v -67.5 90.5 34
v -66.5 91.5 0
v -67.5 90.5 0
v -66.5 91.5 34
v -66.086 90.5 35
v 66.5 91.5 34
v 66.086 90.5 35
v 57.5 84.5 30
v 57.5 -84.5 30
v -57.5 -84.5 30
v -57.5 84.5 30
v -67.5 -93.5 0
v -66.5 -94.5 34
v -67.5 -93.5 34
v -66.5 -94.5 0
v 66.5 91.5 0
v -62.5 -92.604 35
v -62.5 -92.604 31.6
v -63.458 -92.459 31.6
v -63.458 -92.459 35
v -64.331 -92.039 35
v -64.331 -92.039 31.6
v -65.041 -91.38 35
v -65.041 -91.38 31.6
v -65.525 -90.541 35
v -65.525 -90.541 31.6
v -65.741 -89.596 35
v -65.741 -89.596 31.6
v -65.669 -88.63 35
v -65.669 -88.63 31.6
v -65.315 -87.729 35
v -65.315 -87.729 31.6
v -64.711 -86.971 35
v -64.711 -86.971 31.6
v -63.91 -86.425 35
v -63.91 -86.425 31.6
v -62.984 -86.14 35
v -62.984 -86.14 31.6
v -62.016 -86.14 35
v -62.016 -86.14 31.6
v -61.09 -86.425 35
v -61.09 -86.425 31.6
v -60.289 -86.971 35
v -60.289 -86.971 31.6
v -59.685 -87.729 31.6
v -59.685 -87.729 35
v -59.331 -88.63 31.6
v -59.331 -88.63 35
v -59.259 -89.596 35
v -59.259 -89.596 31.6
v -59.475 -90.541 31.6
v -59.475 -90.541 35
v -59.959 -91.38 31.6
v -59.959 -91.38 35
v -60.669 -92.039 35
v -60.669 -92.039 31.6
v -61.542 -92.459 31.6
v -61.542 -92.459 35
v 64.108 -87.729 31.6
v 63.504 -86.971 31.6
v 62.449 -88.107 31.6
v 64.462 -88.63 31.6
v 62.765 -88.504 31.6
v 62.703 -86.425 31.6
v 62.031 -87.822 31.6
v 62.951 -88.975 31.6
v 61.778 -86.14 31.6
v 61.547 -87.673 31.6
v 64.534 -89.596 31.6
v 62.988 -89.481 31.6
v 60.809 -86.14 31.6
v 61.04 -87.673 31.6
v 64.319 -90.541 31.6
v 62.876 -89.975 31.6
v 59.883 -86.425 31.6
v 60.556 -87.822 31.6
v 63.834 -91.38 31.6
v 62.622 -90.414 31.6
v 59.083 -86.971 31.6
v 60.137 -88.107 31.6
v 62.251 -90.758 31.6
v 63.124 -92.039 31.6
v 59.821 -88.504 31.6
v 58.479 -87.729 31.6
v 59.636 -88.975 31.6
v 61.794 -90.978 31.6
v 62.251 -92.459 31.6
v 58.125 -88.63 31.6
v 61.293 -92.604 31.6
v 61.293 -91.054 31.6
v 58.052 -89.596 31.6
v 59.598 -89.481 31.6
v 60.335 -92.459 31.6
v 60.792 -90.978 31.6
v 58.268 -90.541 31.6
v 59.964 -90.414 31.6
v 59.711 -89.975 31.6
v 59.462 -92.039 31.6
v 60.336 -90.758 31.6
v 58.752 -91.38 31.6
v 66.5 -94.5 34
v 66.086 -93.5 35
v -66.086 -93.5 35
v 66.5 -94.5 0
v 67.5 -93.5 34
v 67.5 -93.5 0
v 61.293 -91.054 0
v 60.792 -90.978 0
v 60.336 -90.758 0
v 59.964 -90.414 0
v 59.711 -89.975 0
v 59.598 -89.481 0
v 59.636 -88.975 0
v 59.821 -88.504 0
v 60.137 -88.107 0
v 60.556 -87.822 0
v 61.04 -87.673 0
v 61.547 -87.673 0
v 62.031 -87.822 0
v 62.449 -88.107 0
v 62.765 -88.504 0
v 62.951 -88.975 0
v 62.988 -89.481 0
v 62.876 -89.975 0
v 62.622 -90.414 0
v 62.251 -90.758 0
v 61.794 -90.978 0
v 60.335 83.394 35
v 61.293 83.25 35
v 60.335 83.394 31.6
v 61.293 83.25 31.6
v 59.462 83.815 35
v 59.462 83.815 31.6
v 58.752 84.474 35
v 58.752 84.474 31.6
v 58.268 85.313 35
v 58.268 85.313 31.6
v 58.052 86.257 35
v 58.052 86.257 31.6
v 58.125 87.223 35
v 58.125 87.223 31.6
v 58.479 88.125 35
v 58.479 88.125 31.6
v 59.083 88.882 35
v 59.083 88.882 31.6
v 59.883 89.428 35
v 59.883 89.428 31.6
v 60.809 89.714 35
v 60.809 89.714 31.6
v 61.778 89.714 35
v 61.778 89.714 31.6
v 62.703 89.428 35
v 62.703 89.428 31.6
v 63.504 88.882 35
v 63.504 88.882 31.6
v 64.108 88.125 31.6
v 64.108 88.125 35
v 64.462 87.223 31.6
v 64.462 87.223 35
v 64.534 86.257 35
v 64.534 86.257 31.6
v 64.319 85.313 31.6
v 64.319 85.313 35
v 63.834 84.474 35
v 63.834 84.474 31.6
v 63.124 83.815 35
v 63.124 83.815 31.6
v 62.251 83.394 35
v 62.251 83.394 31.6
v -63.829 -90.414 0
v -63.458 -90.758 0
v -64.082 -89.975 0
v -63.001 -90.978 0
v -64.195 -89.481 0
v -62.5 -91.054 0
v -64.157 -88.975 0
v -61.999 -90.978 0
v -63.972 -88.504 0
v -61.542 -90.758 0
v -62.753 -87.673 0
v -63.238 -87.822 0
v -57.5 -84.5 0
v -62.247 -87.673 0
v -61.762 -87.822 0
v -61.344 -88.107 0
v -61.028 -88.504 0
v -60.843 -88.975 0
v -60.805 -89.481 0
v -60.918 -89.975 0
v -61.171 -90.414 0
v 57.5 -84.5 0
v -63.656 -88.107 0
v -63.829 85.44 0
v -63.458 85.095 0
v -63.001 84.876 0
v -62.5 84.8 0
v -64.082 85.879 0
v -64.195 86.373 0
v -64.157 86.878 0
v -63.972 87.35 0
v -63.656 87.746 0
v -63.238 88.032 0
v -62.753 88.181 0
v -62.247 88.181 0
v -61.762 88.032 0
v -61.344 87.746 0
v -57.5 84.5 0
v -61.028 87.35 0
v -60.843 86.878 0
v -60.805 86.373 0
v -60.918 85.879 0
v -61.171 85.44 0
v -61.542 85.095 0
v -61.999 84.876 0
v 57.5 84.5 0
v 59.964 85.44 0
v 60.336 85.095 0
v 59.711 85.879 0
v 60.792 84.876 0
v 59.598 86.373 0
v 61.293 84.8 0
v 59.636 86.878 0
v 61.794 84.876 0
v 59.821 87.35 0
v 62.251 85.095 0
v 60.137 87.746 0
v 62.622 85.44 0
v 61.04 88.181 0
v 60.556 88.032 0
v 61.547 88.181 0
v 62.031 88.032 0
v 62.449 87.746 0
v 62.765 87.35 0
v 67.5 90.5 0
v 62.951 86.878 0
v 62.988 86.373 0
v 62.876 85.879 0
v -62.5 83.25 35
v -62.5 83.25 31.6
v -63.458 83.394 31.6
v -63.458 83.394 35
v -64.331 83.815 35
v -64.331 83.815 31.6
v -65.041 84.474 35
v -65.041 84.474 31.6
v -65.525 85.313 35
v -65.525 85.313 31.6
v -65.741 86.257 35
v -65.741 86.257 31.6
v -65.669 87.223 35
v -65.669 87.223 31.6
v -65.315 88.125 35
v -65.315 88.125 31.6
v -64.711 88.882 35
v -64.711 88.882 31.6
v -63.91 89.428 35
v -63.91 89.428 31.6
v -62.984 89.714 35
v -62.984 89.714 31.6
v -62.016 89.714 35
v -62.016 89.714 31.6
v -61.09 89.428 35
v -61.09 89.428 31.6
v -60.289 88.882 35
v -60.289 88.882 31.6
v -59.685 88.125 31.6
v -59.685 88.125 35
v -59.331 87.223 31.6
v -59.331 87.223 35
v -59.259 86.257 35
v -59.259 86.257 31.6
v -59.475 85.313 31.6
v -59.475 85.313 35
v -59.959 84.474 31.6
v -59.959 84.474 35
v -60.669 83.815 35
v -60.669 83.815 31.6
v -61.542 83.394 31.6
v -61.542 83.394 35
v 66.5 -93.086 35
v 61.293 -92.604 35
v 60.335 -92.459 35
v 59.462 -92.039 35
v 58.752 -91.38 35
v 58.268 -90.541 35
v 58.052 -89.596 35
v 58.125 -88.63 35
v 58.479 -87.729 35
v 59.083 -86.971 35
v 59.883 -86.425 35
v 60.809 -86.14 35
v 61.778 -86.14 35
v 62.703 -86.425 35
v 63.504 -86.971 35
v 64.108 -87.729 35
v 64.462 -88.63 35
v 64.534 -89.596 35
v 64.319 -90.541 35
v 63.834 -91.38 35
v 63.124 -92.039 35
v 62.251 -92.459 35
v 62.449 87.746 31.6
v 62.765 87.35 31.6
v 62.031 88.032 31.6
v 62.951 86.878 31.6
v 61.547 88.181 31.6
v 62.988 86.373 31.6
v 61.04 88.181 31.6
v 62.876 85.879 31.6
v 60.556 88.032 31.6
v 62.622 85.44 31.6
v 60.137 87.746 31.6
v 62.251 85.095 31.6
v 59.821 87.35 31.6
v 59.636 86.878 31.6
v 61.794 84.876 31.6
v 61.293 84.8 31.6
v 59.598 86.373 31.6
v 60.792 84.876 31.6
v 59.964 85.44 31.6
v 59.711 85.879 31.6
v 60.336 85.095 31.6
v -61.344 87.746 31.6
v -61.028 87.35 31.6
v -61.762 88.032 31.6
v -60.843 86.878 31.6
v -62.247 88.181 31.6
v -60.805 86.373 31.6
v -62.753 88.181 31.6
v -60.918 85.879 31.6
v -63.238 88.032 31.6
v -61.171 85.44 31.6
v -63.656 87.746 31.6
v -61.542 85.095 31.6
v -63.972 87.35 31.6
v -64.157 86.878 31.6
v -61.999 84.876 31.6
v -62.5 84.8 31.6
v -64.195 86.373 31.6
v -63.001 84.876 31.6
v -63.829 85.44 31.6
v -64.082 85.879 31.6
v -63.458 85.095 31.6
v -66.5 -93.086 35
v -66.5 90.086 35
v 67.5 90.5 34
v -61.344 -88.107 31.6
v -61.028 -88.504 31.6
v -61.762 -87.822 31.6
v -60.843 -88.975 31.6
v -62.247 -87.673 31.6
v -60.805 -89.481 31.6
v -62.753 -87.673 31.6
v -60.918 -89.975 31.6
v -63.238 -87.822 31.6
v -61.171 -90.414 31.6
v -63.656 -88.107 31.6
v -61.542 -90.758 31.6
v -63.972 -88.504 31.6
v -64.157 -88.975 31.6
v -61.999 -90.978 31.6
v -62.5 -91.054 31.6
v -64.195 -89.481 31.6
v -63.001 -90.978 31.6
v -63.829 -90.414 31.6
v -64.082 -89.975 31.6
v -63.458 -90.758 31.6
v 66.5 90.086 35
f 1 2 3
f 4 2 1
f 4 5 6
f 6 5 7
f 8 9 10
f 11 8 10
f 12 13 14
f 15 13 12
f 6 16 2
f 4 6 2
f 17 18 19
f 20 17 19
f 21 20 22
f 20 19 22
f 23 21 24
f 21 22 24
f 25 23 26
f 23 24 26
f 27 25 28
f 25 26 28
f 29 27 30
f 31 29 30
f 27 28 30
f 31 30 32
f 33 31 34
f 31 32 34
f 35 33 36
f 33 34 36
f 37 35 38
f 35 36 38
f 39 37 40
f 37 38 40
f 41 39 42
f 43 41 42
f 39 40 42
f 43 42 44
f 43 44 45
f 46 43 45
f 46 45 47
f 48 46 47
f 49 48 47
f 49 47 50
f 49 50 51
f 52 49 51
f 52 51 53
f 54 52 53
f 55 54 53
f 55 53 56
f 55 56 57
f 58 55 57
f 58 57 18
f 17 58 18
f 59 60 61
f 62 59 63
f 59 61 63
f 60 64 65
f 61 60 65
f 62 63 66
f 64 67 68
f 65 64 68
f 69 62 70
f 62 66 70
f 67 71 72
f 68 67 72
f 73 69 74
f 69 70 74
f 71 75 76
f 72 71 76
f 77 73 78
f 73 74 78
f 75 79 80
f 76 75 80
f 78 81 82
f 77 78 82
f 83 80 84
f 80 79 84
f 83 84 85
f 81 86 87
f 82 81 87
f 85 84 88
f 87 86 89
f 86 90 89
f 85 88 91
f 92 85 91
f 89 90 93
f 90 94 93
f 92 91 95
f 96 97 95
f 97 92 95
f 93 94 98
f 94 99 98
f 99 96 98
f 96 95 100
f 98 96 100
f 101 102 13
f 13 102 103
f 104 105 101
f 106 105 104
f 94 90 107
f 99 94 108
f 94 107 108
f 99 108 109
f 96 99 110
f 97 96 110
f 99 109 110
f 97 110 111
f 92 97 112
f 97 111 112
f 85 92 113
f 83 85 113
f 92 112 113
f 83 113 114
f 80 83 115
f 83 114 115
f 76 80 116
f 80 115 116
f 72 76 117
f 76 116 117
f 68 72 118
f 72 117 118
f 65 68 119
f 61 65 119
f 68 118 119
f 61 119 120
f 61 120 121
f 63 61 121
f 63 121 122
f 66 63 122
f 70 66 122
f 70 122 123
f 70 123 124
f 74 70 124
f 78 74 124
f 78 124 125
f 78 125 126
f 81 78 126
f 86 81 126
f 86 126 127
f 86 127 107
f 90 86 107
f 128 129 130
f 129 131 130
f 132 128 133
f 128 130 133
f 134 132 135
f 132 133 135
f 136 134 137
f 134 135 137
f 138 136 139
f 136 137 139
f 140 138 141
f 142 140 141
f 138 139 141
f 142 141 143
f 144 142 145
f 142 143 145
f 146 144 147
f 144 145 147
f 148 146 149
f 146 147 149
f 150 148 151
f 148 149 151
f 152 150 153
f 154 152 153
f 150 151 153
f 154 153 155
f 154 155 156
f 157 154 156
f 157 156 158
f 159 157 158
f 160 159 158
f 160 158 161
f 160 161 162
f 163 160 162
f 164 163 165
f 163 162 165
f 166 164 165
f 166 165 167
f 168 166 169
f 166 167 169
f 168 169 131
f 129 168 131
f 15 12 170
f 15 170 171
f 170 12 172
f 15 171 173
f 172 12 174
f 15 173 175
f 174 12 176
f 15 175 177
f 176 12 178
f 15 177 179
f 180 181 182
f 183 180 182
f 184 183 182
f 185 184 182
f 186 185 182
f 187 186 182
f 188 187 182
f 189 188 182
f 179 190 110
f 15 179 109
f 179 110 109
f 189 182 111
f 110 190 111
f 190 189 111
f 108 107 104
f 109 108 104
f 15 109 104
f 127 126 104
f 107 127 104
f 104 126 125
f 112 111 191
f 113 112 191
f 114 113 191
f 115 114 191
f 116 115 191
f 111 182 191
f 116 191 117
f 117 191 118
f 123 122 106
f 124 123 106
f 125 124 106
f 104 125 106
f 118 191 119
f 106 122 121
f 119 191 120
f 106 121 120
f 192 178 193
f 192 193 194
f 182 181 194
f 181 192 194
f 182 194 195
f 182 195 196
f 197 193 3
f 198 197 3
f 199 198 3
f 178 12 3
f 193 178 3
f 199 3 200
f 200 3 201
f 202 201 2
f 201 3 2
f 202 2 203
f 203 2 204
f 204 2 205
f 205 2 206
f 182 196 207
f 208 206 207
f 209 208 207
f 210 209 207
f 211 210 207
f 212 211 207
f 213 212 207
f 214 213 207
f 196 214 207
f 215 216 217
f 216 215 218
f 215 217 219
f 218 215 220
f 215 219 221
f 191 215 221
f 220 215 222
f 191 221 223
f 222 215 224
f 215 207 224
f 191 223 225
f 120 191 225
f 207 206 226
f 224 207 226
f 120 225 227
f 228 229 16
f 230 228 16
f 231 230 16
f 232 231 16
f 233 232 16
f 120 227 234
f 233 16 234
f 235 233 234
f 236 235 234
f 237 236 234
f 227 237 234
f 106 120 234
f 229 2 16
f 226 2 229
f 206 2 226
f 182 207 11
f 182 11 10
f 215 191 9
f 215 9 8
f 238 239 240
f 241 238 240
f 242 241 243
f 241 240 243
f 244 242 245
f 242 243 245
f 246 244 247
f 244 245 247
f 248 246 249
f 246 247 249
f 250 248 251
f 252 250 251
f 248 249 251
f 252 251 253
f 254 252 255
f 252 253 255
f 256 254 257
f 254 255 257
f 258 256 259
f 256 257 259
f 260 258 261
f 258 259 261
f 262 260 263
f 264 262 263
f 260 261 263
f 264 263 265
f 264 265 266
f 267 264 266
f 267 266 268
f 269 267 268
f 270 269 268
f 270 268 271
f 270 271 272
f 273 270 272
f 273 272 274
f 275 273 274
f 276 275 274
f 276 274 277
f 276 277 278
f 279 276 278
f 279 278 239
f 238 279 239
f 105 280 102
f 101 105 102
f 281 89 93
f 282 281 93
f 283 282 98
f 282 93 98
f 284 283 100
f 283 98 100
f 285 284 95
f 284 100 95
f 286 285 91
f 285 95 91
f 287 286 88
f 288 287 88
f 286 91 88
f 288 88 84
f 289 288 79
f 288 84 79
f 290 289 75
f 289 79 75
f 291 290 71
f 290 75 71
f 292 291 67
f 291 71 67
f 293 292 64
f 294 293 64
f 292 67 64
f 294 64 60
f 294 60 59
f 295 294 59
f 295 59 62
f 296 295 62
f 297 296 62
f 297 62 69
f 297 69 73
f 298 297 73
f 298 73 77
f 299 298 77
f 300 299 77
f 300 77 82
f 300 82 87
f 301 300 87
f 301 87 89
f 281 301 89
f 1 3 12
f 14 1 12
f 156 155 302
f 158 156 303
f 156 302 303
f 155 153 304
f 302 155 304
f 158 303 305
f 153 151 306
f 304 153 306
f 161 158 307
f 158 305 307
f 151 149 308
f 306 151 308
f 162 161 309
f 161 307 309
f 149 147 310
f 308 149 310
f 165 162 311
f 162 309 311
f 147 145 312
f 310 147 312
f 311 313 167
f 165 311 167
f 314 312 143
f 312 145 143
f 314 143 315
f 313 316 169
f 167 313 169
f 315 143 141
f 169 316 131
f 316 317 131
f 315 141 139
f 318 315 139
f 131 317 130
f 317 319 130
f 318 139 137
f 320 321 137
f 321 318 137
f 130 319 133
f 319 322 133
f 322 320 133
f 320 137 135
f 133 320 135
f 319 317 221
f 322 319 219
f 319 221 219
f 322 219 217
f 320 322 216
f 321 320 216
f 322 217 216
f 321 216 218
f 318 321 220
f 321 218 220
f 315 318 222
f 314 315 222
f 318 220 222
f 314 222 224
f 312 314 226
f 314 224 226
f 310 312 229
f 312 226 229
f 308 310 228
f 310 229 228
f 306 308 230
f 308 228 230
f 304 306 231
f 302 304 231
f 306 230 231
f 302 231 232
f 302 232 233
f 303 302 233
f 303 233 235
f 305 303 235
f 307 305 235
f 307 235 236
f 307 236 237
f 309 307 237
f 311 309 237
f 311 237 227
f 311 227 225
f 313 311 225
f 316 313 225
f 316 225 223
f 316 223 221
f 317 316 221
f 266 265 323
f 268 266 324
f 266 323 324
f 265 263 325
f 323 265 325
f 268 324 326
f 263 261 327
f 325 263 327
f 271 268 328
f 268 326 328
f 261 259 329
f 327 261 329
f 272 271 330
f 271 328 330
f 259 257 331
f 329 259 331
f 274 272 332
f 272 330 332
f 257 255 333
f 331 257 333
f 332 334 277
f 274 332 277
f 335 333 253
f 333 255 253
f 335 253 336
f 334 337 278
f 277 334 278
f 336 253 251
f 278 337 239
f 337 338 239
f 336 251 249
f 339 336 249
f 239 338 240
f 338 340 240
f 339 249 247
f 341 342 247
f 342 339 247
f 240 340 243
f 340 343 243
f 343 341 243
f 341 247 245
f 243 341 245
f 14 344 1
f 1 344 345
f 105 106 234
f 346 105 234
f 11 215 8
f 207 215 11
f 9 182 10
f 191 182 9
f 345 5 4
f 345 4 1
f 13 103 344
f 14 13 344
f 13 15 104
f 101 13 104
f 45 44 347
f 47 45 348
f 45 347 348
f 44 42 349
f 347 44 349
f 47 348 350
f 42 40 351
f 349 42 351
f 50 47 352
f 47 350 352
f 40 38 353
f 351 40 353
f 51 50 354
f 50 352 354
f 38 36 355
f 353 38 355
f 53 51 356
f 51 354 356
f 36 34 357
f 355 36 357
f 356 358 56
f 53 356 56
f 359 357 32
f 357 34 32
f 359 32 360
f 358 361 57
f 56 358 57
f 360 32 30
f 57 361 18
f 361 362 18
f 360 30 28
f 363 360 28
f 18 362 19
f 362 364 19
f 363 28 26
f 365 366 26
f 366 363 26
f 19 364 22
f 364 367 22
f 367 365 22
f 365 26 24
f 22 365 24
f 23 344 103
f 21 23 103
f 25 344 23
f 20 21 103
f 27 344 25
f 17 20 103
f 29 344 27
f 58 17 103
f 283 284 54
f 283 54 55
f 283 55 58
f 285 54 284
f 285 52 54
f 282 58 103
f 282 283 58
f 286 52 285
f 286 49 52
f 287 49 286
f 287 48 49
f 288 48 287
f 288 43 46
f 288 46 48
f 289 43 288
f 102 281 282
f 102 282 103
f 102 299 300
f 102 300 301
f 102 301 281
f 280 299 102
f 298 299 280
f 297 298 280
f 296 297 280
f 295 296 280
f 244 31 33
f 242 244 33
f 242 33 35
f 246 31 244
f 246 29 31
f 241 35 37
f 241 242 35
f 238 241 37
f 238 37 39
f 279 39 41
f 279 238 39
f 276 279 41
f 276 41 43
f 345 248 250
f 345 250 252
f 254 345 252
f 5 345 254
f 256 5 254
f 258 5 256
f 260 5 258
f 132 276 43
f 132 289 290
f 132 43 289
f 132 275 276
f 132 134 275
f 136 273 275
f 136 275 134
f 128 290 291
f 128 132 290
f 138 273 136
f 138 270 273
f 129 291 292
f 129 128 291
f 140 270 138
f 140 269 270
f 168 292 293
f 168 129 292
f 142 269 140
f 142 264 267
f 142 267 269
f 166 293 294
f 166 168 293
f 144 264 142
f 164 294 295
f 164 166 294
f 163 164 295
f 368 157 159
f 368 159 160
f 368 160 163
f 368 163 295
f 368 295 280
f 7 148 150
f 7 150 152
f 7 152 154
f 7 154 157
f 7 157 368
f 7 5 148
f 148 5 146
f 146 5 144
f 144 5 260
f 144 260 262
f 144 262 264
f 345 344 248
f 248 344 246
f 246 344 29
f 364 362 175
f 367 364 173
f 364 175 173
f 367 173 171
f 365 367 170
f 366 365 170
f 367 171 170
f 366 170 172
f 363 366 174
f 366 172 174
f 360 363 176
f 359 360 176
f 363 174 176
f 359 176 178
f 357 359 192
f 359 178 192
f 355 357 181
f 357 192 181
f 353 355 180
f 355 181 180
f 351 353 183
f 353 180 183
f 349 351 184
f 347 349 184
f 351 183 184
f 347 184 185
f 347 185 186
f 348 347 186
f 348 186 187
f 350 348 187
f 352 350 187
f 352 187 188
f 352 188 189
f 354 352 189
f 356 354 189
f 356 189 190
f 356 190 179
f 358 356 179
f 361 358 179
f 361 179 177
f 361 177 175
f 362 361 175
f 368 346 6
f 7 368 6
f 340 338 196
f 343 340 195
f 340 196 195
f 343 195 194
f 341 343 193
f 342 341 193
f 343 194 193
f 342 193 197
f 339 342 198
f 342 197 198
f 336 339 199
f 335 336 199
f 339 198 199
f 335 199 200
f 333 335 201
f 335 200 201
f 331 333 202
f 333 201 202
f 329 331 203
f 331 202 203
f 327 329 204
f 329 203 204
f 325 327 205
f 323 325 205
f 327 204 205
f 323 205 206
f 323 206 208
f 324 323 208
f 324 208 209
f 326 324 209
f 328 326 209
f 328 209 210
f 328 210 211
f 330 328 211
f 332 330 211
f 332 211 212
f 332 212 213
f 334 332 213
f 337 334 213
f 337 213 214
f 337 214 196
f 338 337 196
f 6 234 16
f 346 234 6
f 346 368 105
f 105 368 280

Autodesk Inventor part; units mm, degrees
ref_plane "YZ Plane" through (0, 0, 0) normal (1, 0, 0) x (0, 1, 0)
ref_plane "XZ Plane" through (0, 0, 0) normal (0, 1, 0) x (-1, 0, 0)
ref_plane "XY Plane" through (0, 0, 0) normal (0, 0, 1) x (1, 0, 0)
sketch "Sketch1" plane through (0, 0, 0) normal (0, 0, 1) x (1, 0, 0)
  line L0 (-61.5, -83.5) -> (62.5, -83.5)
  line L1 (62.5, -83.5) -> (62.5, 73.5)
  line L2 (62.5, 73.5) -> (-61.5, 73.5)
  line L3 (-61.5, 73.5) -> (-61.5, -83.5)
  line L4 (-67.5, -94.5) -> (67.5, -94.5) projected
  line L5 (67.5, -94.5) -> (67.5, 91.5) projected
  line L6 (62.5, -70.5) -> (-20.5, -70.5) projected
  line L7 (-20.5, 73.5) -> (62.5, 73.5) projected
  line L8 (62.5, 73.5) -> (62.5, -70.5) projected
  line L9 (67.5, 91.5) -> (-67.5, 91.5) projected
  line L10 (-67.5, 91.5) -> (-67.5, -94.5) projected
  circle A0 centre (61.2932, 86.5) radius 2 projected
  circle A1 centre (61.2932, -89.3536) radius 2 projected
  circle A2 centre (-62.5, -89.3536) radius 2 projected
  circle A3 centre (-62.5, 86.5) radius 2 projected
  line L11 (-64.5, -83.5) -> (-64.5, 80.5) projected
  line L12 (-58.5, 86.5) -> (-64.5, 80.5) projected
  line L13 (-58.5, 86.5) -> (-30.5, 86.5) projected
  line L14 (-30.5, 86.5) -> (-30.5, 24) projected
  line L15 (-30.5, 24) -> (-20.5, 24) projected
  line L16 (-20.5, 24) -> (-20.5, 73.5) projected
  line L17 (-20.5, -70.5) -> (-20.5, -21) projected
  line L18 (-20.5, -21) -> (-30.5, -21) projected
  line L19 (-30.5, -21) -> (-30.5, -89.5) projected
  line L20 (-30.5, -89.5) -> (-58.5, -89.5) projected
  line L21 (-64.5, -83.5) -> (-58.5, -89.5) projected
  point P0 (0, 0)
  point P1 (67.5, -91)
  point P2 (67, 91.5)
  point P3 (-67, 91.5)
  point P4 (-67.5, 91)
extrude "Extrusion1" add sketch "Sketch1" along normal blind 35 contours L3 L2 L14 L15 L16 L1 L6 L17 L18 L19 L0 | L0 L19 L20 L21 L11 L12 L13 L14 L2 L3 | L19 L18 L17 L6 L1 L0 | L2 L16 L15 L14 | L10 L9 L5 L4 | A0 | A1 | A2 | A3
sketch "Skizze3" plane through (0, 0, 35) normal (0, 0, 1) x (1, 0, 0)
  circle A0 centre (61.2932, 86.5) radius 2 projected
  circle A1 centre (-62.5, 86.5) radius 2 projected
  circle A2 centre (61.2932, -89.3536) radius 2 projected
  circle A3 centre (-62.5, -89.3536) radius 2 projected
  point P0 (0, 0)
hole "Bohrung1" at (-62.5, 86.5, 35) at (61.2932, 86.5, 35) at (61.2932, -89.3536, 35) at (-62.5, -89.3536, 35) direction (0, 0, -1) diameter 3.4 end through all counterbore diameter 6.5 counterbore depth 3.4 clearance for "Inbusschraube DIN EN ISO 4762" size "M3" standard "DIN"
sketch "Skizze4" plane through (0, 0, 0) normal (0, 0, -1) x (-1, 0, 0)
  line L0 (-57.5, 84.5) -> (57.5, 84.5)
  line L1 (57.5, 84.5) -> (57.5, -84.5)
  line L2 (57.5, -84.5) -> (-57.5, -84.5)
  line L3 (-57.5, -84.5) -> (-57.5, 84.5)
  line L4 (-57.5, 84.5) -> (57.5, -84.5) construction
  line L5 (57.5, 84.5) -> (-57.5, -84.5) construction
  line L6 (67.5, 91.5) -> (67.5, -94.5) projected
  line L7 (67.5, -94.5) -> (-67.5, -94.5) projected
  point P0 (0, 0)
  dimension "d14" = 10
  dimension "d15" = 10
extrude "Extrusion3" cut sketch "Skizze4" against normal blind 30
chamfer "Fasen2" distance 1 angle 45 4 edges at (-67.5, -94.5, 17.5) (-67.5, 91.5, 17.5) (67.5, 91.5, 17.5) (67.5, -94.5, 17.5)
chamfer "Fasen3" distance 1 angle 45 8 edges at (-67.5, -1.5, 35) (0, 91.5, 35) (67.5, -1.5, 35) (0, -94.5, 35) (-67, -94, 35) (67, -94, 35) (67, 91, 35) (-67, 91, 35)
properties part number "Kameraturm_Deckel"
